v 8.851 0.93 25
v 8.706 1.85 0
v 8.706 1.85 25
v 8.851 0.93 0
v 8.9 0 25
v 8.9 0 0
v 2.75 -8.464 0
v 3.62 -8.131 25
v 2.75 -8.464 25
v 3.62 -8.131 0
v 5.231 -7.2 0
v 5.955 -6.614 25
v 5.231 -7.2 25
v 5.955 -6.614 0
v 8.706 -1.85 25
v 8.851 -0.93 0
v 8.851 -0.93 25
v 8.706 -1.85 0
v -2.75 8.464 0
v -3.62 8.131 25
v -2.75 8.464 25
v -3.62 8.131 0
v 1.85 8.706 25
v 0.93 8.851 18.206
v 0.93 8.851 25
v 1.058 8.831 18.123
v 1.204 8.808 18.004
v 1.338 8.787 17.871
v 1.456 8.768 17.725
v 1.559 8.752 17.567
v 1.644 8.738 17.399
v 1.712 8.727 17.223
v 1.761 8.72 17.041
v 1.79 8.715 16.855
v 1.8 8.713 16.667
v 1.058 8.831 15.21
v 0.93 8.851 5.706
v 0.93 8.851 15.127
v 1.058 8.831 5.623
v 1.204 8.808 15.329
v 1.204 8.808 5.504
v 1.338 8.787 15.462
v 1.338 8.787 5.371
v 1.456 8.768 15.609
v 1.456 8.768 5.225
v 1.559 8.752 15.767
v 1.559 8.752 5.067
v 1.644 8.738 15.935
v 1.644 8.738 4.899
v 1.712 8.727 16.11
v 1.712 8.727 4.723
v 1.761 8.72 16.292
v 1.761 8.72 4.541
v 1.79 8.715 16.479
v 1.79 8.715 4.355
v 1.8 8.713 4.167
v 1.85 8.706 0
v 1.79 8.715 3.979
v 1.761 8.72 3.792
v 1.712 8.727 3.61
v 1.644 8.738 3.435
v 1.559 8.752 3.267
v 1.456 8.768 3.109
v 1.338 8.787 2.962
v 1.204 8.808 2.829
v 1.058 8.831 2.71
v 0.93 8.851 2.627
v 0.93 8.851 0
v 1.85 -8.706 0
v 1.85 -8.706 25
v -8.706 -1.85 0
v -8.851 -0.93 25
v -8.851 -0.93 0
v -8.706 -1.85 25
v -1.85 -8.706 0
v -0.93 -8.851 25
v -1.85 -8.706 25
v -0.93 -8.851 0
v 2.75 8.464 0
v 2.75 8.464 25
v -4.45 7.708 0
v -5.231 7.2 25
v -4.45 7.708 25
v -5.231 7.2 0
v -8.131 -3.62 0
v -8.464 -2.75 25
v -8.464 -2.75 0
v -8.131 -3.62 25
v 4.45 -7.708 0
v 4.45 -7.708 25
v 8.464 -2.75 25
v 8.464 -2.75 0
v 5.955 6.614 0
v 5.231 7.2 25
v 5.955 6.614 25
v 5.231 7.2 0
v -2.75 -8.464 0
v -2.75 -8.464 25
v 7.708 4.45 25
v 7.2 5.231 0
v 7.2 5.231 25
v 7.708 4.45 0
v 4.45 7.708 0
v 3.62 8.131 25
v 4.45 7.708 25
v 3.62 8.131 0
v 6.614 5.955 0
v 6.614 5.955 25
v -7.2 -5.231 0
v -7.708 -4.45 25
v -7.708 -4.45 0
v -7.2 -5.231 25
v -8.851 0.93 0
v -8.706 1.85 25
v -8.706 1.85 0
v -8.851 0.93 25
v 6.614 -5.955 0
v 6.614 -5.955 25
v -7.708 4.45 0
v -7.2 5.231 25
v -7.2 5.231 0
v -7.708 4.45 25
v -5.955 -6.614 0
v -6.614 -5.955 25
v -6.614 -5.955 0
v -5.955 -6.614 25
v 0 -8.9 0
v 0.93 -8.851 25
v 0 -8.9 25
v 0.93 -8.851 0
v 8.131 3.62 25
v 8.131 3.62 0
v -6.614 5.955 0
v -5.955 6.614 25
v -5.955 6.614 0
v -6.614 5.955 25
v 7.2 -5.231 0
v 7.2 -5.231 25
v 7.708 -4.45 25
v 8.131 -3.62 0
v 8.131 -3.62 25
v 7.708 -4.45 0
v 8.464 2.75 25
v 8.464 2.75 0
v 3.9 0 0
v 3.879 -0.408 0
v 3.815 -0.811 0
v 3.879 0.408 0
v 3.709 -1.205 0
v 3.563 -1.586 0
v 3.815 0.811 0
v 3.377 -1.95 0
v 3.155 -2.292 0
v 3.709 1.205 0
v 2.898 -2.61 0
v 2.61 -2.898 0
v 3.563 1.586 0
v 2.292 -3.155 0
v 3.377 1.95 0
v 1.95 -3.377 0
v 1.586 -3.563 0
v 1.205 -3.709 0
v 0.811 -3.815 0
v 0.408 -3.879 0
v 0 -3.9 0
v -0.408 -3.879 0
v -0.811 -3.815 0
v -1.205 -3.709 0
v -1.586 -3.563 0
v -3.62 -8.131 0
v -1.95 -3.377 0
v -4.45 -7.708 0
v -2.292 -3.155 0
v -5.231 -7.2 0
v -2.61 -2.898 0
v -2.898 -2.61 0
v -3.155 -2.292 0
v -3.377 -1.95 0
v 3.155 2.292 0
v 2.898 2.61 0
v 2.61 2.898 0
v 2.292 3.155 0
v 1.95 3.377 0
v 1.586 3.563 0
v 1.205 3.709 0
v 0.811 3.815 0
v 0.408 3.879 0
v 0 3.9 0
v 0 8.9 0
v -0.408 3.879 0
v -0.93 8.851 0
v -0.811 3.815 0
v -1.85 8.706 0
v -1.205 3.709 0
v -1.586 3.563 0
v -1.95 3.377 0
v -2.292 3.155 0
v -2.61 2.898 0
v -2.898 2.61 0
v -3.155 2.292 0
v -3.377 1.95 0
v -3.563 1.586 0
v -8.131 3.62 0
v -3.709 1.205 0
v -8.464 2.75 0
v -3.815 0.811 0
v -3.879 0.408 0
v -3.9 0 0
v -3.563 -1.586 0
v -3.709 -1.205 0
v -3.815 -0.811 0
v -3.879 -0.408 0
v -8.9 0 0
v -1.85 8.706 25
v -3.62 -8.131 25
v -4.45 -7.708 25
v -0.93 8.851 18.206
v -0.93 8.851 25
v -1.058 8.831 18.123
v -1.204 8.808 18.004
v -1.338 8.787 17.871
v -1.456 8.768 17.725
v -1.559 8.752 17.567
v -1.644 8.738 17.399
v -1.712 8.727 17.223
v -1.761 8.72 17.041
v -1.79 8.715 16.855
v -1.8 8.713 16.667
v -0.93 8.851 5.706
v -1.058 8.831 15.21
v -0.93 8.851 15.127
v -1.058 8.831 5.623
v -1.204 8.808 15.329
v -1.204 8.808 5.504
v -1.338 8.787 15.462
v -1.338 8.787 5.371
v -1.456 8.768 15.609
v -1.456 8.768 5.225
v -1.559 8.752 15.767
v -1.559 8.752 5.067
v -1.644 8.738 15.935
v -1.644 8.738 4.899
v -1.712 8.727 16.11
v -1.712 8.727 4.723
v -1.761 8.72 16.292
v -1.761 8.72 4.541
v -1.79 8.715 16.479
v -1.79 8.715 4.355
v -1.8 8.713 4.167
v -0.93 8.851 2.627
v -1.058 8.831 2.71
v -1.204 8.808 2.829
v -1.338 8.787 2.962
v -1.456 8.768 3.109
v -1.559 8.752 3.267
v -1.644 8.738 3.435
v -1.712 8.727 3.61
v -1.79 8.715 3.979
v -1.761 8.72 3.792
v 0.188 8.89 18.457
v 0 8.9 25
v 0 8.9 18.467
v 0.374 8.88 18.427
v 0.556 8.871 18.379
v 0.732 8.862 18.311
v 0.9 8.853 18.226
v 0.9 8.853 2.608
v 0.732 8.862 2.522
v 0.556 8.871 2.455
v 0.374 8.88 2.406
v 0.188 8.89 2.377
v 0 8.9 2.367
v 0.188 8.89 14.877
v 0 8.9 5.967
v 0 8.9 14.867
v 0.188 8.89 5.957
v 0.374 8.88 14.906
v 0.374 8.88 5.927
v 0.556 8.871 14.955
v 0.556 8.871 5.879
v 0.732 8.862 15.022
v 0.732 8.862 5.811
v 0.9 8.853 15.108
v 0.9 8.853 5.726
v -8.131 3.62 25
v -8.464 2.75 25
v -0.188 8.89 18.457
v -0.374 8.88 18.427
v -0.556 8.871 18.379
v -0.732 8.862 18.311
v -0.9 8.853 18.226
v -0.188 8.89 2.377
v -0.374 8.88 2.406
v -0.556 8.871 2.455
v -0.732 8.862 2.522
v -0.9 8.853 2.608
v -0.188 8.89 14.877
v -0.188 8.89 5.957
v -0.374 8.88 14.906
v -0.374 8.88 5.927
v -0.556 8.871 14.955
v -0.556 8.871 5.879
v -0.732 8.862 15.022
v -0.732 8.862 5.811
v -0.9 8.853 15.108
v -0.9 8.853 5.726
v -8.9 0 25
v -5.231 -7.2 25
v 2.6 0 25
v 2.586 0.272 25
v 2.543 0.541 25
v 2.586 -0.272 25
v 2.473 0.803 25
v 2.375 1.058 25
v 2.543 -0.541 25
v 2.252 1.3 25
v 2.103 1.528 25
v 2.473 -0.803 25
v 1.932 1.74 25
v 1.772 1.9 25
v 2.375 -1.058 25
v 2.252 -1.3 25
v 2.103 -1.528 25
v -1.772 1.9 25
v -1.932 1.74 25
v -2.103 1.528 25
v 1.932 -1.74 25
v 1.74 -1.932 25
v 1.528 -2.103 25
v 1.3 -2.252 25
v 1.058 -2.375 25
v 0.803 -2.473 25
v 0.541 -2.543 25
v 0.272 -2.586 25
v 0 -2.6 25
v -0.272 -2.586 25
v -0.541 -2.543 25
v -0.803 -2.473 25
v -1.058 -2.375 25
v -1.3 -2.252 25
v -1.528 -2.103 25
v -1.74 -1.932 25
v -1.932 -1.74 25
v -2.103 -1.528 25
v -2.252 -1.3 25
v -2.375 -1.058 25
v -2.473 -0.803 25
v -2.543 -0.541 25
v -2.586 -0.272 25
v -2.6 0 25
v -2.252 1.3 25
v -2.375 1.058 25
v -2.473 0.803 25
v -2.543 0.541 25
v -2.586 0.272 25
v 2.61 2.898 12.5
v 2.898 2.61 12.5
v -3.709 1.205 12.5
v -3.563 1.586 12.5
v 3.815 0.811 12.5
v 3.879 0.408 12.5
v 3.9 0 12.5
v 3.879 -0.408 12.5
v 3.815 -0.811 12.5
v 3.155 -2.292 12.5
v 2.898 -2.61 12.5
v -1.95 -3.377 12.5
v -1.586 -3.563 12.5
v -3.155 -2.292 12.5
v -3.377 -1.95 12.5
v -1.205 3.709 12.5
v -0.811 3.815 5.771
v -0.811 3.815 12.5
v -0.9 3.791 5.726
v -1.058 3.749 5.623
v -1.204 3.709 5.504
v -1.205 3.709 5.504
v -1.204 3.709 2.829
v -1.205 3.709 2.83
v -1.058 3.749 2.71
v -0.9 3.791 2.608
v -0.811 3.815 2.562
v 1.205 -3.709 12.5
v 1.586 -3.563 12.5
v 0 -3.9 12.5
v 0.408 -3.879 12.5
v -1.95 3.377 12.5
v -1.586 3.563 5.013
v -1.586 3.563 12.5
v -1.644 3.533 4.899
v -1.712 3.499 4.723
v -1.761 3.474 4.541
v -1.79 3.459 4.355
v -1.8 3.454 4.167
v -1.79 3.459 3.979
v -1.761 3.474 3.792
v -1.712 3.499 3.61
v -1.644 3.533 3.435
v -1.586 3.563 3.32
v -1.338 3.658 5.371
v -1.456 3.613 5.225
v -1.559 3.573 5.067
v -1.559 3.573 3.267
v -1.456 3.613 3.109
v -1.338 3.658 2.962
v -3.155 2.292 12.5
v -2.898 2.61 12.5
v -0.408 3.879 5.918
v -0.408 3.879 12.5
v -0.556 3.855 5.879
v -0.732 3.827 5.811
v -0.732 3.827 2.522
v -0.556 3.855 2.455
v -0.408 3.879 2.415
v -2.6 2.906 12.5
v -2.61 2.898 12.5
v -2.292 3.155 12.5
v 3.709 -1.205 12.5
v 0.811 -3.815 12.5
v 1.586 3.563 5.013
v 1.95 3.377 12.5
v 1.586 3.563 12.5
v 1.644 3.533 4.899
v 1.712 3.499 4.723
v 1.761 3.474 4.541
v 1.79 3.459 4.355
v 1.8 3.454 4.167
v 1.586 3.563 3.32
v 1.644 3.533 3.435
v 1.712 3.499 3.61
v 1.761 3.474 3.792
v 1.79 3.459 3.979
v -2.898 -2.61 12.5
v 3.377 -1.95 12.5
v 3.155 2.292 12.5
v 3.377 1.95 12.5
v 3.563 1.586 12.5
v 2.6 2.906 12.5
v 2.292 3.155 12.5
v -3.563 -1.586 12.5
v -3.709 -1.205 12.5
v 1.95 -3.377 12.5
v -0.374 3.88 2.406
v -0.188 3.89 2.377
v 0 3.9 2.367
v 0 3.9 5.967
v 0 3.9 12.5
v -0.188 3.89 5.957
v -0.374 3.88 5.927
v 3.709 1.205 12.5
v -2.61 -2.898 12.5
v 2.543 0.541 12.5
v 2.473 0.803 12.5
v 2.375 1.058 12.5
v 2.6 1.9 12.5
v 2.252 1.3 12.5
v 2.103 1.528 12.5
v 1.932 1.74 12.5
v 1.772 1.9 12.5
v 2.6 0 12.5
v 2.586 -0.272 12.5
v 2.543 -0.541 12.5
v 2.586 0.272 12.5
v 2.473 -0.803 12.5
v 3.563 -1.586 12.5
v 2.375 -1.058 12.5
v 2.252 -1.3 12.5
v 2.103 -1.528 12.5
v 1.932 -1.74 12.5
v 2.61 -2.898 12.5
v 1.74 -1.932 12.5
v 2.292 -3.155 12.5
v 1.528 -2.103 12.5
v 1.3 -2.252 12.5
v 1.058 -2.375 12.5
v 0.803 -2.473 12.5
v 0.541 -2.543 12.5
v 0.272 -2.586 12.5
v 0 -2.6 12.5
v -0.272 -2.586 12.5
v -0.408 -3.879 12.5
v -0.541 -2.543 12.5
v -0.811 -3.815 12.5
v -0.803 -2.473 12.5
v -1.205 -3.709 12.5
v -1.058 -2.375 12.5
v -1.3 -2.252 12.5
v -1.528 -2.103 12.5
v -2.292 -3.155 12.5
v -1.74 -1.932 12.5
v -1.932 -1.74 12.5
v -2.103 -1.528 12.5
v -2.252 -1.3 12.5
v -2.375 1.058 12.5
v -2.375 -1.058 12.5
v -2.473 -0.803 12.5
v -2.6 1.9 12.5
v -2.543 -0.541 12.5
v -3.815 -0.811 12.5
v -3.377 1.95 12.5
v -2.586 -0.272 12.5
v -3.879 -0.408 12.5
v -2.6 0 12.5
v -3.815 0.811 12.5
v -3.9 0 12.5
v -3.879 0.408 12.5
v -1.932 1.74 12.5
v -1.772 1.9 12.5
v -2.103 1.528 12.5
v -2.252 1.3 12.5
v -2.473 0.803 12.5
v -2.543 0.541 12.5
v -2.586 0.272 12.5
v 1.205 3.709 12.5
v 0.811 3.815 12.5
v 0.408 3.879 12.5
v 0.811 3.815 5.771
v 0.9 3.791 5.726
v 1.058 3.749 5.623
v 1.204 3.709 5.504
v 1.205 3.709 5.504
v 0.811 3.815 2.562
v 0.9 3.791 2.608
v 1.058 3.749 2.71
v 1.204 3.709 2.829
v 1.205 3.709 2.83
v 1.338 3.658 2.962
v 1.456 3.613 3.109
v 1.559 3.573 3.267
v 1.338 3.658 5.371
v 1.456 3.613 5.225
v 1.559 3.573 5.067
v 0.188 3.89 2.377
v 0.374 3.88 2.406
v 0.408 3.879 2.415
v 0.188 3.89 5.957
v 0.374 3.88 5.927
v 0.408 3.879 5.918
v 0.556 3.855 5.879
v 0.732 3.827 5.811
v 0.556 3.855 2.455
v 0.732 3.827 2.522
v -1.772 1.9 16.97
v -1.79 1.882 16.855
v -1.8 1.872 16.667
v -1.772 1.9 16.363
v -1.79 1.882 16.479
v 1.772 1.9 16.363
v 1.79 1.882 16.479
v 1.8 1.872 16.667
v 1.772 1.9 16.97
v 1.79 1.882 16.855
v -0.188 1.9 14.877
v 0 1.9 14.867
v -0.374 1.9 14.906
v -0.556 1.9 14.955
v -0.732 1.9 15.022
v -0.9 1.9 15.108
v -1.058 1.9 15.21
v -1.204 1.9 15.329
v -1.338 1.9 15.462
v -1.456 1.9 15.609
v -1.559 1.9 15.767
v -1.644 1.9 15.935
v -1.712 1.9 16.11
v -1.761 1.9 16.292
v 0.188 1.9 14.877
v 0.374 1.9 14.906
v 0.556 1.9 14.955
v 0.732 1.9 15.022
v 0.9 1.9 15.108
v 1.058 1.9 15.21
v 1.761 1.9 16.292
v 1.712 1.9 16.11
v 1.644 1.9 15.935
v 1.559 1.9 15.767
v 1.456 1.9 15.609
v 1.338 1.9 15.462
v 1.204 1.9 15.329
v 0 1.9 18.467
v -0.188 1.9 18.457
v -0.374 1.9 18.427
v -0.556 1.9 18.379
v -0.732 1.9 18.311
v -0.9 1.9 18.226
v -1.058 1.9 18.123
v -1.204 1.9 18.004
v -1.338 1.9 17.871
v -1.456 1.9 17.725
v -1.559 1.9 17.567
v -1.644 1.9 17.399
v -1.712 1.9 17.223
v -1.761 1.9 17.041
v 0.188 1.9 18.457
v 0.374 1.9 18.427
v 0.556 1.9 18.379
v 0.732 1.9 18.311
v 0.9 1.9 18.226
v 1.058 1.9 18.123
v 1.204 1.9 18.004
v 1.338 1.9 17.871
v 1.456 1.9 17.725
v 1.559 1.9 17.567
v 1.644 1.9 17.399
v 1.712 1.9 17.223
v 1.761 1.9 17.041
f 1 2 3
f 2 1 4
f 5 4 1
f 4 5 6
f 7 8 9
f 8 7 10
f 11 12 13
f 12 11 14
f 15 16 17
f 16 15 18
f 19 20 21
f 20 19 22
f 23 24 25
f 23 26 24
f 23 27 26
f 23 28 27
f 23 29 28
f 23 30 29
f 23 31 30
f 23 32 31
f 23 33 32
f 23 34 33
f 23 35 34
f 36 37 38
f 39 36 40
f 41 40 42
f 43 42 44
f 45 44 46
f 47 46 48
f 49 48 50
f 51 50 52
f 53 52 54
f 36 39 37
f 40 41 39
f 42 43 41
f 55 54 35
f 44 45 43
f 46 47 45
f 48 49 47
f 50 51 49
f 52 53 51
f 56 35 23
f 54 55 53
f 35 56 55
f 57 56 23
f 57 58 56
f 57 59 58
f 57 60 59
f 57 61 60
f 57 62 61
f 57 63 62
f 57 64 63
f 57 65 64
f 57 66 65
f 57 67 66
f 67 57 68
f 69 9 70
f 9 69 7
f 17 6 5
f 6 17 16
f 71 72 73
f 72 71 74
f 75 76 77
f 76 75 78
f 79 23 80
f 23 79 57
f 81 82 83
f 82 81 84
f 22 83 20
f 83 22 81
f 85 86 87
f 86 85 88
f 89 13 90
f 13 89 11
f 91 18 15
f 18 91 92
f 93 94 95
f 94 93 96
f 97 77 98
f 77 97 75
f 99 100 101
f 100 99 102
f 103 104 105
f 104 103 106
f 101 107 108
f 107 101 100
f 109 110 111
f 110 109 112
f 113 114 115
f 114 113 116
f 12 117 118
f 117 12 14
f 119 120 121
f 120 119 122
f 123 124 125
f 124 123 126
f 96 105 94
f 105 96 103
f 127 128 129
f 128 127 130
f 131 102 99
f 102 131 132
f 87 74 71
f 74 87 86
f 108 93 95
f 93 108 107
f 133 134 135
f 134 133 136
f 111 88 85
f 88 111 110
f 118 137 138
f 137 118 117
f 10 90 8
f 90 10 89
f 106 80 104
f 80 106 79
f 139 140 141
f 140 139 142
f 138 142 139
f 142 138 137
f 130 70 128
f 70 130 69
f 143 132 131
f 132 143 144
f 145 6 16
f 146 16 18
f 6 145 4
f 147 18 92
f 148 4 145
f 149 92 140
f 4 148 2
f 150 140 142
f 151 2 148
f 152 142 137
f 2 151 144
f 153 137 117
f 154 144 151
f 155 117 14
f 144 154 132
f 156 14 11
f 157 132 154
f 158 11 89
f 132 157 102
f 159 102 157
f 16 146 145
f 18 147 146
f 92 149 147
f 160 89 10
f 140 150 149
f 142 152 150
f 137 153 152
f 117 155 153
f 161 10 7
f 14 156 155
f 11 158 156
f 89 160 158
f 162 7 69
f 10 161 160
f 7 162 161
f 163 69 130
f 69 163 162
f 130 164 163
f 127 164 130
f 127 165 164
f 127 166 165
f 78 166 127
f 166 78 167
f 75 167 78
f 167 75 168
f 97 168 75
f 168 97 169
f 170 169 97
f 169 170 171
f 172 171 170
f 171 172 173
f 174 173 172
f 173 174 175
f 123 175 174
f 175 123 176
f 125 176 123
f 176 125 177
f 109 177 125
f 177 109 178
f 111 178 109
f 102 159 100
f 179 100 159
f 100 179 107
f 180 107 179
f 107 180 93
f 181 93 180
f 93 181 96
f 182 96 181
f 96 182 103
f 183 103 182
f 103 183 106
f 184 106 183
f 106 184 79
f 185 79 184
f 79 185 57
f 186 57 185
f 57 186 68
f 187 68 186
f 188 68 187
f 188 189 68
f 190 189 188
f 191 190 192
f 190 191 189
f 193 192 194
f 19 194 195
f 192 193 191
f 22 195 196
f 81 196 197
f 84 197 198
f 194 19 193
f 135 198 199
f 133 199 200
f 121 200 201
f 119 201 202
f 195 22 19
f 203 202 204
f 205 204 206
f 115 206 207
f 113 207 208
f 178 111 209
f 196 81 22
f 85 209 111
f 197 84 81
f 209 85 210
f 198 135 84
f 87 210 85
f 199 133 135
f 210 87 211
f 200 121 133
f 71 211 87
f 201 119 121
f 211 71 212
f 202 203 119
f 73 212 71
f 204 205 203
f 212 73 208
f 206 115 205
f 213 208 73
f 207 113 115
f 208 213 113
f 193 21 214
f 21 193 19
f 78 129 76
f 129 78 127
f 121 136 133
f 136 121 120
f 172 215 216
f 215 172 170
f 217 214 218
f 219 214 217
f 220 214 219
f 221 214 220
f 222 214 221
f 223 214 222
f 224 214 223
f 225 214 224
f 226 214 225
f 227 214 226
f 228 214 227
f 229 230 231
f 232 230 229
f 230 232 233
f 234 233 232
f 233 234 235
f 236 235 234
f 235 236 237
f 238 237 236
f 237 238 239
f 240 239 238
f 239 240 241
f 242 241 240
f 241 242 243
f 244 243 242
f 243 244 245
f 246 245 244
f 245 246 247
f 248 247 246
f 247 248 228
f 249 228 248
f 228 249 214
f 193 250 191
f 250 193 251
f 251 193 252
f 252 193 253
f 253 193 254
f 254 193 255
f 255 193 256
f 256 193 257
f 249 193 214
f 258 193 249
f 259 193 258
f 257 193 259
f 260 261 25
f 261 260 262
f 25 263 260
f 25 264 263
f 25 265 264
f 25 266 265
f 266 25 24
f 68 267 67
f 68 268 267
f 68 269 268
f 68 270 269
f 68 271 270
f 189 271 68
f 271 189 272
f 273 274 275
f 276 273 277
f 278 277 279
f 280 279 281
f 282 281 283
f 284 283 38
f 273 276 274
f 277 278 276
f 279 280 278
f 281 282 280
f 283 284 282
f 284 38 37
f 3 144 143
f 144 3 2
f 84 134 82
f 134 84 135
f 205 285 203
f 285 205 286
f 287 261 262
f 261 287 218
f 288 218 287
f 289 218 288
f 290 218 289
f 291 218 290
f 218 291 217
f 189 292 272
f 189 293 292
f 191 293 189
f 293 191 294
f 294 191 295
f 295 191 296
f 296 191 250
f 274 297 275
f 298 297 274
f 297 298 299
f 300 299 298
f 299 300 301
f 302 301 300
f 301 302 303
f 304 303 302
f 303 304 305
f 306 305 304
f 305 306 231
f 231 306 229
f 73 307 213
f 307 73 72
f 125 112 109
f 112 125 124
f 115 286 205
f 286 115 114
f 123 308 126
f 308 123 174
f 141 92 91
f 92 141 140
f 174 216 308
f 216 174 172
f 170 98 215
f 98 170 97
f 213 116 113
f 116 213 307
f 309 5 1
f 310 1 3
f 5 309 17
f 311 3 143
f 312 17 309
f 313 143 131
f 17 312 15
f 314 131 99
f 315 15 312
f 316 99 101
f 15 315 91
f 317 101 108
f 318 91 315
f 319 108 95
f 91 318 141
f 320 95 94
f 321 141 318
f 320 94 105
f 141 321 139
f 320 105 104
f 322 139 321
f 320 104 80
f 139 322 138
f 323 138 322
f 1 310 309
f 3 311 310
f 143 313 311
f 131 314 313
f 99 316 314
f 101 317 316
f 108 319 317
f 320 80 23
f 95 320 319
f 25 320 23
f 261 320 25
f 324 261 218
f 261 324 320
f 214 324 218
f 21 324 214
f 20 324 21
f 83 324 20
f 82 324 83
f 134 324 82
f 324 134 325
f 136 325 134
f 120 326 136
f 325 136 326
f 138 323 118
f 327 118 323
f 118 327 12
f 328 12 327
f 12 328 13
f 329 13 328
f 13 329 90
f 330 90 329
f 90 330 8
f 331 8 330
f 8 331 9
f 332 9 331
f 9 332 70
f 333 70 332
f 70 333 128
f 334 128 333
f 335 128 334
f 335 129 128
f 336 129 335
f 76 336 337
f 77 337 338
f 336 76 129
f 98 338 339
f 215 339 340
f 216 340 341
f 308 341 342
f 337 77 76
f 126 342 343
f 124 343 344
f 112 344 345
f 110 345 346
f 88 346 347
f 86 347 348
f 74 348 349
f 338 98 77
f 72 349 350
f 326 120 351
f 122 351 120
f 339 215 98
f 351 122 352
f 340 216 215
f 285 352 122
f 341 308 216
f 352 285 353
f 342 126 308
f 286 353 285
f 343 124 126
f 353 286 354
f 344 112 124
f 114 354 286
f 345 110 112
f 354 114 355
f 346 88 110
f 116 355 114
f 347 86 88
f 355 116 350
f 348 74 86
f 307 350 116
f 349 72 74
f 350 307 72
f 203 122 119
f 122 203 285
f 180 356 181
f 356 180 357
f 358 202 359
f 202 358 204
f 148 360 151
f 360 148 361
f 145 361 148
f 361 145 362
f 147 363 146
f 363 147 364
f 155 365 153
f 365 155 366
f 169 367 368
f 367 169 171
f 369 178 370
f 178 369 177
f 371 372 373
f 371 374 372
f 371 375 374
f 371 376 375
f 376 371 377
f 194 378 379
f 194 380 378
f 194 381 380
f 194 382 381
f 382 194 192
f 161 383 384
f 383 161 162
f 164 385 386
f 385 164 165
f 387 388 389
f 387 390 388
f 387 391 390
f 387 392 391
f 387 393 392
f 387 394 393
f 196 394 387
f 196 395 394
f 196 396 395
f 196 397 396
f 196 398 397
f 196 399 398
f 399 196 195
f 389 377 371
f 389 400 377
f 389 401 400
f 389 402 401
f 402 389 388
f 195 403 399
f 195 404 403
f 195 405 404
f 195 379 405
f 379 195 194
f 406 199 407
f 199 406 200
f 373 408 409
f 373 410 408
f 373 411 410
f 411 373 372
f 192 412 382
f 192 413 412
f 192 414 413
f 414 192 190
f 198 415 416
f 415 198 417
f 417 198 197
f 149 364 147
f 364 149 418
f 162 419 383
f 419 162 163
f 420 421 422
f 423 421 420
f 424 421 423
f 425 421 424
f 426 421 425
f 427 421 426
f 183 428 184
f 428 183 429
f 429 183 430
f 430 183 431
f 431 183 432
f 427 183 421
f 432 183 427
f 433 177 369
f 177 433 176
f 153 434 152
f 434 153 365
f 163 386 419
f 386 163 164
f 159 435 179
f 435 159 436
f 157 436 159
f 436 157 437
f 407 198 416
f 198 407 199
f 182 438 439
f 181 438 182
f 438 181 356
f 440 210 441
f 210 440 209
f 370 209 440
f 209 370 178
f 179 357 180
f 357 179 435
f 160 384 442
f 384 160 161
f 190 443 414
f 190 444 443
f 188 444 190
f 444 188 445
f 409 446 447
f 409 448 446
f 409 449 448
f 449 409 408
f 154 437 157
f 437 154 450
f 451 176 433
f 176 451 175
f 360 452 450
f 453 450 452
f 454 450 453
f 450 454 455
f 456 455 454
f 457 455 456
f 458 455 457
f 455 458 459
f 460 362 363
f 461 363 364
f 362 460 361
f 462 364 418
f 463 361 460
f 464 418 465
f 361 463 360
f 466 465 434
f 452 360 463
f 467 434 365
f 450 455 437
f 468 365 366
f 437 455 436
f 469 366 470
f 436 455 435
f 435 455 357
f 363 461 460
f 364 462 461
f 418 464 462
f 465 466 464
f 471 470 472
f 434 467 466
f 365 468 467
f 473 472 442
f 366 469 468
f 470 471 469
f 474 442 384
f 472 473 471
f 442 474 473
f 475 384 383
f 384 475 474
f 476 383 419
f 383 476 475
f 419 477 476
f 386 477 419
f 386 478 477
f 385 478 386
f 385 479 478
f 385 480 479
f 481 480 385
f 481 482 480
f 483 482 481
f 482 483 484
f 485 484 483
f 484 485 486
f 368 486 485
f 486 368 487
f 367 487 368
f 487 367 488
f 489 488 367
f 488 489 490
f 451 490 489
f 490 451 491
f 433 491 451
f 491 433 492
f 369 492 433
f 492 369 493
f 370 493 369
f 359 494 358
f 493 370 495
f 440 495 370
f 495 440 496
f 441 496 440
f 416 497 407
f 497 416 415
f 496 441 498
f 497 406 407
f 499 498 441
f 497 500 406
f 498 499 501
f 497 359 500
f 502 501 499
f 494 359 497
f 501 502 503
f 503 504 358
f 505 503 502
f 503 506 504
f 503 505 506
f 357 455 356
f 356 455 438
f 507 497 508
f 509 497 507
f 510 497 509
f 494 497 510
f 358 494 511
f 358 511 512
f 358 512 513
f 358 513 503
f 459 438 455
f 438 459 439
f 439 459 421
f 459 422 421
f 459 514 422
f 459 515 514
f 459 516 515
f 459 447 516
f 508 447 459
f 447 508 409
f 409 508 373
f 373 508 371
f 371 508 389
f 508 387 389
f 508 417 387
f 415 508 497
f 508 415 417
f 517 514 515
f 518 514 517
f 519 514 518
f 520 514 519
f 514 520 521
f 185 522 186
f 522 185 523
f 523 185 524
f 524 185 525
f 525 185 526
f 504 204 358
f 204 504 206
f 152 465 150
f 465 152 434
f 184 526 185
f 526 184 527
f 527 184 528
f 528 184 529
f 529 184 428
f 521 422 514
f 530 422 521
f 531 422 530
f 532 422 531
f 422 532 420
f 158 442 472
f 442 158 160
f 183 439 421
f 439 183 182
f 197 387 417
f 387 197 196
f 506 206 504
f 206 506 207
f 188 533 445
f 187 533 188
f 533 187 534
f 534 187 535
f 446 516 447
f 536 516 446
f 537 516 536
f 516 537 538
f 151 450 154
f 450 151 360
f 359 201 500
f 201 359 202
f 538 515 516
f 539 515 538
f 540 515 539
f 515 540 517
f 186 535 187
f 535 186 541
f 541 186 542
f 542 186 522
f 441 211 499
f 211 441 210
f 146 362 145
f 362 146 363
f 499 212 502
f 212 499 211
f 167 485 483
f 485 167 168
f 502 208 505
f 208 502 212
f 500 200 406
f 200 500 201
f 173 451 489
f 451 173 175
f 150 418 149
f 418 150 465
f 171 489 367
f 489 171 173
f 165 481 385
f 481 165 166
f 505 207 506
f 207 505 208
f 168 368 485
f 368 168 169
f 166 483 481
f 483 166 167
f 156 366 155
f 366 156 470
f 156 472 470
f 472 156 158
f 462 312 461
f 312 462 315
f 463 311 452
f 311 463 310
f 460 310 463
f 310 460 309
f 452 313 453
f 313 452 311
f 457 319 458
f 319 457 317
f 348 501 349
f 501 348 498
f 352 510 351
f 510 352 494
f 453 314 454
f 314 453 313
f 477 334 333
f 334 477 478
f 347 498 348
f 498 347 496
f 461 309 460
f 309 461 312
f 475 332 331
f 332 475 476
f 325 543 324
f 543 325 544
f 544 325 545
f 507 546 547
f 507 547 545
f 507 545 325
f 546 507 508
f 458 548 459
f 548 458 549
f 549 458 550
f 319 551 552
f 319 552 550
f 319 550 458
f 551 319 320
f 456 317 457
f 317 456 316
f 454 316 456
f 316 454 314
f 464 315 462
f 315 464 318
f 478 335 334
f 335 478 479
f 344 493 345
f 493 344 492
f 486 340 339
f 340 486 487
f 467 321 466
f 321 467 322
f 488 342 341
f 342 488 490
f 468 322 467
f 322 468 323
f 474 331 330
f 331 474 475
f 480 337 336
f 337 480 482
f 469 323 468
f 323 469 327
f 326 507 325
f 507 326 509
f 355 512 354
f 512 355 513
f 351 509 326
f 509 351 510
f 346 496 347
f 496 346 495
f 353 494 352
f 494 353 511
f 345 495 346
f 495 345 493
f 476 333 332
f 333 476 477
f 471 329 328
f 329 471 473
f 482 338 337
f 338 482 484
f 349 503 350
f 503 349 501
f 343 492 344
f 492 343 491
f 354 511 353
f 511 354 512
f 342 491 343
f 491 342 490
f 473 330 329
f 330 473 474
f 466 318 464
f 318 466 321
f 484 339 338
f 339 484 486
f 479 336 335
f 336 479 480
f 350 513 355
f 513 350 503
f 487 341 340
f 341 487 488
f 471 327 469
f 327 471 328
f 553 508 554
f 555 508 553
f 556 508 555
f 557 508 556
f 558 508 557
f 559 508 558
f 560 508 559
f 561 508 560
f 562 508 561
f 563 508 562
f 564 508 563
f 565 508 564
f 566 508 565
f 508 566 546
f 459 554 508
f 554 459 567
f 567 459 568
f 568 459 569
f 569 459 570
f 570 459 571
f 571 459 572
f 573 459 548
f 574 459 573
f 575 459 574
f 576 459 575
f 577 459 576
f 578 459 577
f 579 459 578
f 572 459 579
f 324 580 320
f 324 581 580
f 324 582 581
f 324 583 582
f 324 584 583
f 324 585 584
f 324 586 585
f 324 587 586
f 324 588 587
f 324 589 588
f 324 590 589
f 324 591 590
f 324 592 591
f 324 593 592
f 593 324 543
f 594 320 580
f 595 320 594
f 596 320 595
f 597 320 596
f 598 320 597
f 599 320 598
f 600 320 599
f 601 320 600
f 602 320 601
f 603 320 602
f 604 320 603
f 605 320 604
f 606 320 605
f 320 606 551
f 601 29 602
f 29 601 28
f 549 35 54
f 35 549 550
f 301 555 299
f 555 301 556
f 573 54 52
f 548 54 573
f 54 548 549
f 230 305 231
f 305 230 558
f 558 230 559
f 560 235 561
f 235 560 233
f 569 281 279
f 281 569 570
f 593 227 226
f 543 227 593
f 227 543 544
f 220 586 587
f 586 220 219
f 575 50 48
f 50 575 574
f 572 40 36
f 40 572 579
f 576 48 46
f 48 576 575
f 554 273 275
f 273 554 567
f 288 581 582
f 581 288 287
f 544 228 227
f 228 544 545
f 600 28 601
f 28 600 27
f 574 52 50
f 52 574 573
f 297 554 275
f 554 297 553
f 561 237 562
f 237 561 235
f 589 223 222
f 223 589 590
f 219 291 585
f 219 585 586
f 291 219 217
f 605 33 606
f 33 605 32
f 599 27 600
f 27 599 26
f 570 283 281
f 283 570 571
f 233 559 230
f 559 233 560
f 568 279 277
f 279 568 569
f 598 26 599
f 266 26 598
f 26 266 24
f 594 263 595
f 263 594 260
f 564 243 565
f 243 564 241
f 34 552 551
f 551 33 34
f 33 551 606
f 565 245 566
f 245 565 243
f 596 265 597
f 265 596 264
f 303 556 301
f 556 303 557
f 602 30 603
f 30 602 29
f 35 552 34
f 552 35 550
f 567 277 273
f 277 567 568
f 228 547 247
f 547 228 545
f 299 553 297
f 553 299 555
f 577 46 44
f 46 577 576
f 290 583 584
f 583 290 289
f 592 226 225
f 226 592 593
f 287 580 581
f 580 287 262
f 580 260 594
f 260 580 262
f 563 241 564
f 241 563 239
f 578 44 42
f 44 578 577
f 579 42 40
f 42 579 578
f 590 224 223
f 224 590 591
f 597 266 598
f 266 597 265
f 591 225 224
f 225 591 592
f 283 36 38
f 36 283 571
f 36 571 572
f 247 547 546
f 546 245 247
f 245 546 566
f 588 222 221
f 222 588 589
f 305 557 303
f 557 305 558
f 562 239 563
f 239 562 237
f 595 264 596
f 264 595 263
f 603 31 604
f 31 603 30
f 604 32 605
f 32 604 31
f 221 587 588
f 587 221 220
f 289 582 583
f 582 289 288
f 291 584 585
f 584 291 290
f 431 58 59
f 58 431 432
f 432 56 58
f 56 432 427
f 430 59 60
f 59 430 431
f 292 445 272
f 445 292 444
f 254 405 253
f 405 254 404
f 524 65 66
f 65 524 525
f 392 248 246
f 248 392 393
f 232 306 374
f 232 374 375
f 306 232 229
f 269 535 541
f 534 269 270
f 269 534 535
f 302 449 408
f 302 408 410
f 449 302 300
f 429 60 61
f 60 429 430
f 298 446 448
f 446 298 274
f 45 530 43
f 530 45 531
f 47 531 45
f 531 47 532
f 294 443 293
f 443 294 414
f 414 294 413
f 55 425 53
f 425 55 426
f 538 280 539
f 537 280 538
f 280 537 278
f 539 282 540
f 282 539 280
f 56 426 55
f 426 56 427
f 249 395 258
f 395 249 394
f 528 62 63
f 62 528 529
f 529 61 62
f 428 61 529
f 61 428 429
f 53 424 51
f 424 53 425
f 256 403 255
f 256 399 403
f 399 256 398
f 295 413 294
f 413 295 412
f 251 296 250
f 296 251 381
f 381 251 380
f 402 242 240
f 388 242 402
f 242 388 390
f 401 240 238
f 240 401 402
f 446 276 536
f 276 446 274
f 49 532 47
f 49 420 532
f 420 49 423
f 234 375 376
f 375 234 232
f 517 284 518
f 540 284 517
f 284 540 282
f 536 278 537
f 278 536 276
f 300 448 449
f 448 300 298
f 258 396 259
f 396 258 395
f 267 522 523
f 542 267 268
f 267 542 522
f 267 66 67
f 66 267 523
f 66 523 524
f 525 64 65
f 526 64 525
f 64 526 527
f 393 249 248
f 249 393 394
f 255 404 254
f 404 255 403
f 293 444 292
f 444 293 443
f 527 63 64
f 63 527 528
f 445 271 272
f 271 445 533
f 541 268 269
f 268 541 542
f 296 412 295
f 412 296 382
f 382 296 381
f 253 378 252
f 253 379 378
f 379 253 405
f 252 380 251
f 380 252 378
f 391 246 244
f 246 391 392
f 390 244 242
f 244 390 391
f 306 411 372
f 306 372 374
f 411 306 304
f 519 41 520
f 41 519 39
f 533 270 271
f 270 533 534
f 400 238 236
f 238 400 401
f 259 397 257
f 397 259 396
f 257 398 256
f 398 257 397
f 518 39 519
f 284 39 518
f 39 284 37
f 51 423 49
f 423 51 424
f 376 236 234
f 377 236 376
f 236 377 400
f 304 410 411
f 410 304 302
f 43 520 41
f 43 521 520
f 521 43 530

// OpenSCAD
THREAD_DIAMETER = 7.8;
NEMA_SHAFT_DIAMETER = 5.2;
THICKNESS = 5;

COUPLER_HEIGHT = 25;
NEMA_FLAT_THICKNESS = 4.5;

SCREW_DIAMETER = 3.6;
SQUARE_NUT_SIZE = 5.5;
SQUARE_NUT_THICKNESS = 1.6;

$fn = 60;
EXTERNAL_DIAMETER = THREAD_DIAMETER + 2 * THICKNESS;
NEMA_FLAT_OFFSET = NEMA_SHAFT_DIAMETER - NEMA_FLAT_THICKNESS;

difference() {
    union () {
        difference() {
            cylinder(d = EXTERNAL_DIAMETER, h = COUPLER_HEIGHT);
               
            
            cylinder(d = THREAD_DIAMETER, h = COUPLER_HEIGHT / 2);
            translate([0, 0, COUPLER_HEIGHT / 2]) cylinder(d = NEMA_SHAFT_DIAMETER, h = COUPLER_HEIGHT / 2);
        }
            translate([- NEMA_SHAFT_DIAMETER/2, NEMA_SHAFT_DIAMETER/2 - NEMA_FLAT_OFFSET, COUPLER_HEIGHT / 2]) cube([NEMA_SHAFT_DIAMETER, NEMA_SHAFT_DIAMETER, COUPLER_HEIGHT / 2]);
    }
               
    translate([0, 0, COUPLER_HEIGHT/6 * 4]) rotate ([-90, 0, 0]) cylinder(d = SCREW_DIAMETER, h = EXTERNAL_DIAMETER/2);
    
    translate([0, 0, COUPLER_HEIGHT/6]) rotate ([-90, 0, 0]) cylinder(d = SCREW_DIAMETER, h = EXTERNAL_DIAMETER/2);

    /*translate([-SQUARE_NUT_SIZE / 2, THREAD_DIAMETER / 2 + 0.5, 0]) cube([SQUARE_NUT_SIZE, SQUARE_NUT_THICKNESS, SQUARE_NUT_SIZE + SCREW_DIAMETER / 2]);

    #translate([-SQUARE_NUT_SIZE / 2, THREAD_DIAMETER / 2, COUPLER_HEIGHT - (SQUARE_NUT_SIZE + SCREW_DIAMETER / 2) ]) cube([SQUARE_NUT_SIZE, SQUARE_NUT_THICKNESS, SQUARE_NUT_SIZE + SCREW_DIAMETER / 2]);
 */

}
